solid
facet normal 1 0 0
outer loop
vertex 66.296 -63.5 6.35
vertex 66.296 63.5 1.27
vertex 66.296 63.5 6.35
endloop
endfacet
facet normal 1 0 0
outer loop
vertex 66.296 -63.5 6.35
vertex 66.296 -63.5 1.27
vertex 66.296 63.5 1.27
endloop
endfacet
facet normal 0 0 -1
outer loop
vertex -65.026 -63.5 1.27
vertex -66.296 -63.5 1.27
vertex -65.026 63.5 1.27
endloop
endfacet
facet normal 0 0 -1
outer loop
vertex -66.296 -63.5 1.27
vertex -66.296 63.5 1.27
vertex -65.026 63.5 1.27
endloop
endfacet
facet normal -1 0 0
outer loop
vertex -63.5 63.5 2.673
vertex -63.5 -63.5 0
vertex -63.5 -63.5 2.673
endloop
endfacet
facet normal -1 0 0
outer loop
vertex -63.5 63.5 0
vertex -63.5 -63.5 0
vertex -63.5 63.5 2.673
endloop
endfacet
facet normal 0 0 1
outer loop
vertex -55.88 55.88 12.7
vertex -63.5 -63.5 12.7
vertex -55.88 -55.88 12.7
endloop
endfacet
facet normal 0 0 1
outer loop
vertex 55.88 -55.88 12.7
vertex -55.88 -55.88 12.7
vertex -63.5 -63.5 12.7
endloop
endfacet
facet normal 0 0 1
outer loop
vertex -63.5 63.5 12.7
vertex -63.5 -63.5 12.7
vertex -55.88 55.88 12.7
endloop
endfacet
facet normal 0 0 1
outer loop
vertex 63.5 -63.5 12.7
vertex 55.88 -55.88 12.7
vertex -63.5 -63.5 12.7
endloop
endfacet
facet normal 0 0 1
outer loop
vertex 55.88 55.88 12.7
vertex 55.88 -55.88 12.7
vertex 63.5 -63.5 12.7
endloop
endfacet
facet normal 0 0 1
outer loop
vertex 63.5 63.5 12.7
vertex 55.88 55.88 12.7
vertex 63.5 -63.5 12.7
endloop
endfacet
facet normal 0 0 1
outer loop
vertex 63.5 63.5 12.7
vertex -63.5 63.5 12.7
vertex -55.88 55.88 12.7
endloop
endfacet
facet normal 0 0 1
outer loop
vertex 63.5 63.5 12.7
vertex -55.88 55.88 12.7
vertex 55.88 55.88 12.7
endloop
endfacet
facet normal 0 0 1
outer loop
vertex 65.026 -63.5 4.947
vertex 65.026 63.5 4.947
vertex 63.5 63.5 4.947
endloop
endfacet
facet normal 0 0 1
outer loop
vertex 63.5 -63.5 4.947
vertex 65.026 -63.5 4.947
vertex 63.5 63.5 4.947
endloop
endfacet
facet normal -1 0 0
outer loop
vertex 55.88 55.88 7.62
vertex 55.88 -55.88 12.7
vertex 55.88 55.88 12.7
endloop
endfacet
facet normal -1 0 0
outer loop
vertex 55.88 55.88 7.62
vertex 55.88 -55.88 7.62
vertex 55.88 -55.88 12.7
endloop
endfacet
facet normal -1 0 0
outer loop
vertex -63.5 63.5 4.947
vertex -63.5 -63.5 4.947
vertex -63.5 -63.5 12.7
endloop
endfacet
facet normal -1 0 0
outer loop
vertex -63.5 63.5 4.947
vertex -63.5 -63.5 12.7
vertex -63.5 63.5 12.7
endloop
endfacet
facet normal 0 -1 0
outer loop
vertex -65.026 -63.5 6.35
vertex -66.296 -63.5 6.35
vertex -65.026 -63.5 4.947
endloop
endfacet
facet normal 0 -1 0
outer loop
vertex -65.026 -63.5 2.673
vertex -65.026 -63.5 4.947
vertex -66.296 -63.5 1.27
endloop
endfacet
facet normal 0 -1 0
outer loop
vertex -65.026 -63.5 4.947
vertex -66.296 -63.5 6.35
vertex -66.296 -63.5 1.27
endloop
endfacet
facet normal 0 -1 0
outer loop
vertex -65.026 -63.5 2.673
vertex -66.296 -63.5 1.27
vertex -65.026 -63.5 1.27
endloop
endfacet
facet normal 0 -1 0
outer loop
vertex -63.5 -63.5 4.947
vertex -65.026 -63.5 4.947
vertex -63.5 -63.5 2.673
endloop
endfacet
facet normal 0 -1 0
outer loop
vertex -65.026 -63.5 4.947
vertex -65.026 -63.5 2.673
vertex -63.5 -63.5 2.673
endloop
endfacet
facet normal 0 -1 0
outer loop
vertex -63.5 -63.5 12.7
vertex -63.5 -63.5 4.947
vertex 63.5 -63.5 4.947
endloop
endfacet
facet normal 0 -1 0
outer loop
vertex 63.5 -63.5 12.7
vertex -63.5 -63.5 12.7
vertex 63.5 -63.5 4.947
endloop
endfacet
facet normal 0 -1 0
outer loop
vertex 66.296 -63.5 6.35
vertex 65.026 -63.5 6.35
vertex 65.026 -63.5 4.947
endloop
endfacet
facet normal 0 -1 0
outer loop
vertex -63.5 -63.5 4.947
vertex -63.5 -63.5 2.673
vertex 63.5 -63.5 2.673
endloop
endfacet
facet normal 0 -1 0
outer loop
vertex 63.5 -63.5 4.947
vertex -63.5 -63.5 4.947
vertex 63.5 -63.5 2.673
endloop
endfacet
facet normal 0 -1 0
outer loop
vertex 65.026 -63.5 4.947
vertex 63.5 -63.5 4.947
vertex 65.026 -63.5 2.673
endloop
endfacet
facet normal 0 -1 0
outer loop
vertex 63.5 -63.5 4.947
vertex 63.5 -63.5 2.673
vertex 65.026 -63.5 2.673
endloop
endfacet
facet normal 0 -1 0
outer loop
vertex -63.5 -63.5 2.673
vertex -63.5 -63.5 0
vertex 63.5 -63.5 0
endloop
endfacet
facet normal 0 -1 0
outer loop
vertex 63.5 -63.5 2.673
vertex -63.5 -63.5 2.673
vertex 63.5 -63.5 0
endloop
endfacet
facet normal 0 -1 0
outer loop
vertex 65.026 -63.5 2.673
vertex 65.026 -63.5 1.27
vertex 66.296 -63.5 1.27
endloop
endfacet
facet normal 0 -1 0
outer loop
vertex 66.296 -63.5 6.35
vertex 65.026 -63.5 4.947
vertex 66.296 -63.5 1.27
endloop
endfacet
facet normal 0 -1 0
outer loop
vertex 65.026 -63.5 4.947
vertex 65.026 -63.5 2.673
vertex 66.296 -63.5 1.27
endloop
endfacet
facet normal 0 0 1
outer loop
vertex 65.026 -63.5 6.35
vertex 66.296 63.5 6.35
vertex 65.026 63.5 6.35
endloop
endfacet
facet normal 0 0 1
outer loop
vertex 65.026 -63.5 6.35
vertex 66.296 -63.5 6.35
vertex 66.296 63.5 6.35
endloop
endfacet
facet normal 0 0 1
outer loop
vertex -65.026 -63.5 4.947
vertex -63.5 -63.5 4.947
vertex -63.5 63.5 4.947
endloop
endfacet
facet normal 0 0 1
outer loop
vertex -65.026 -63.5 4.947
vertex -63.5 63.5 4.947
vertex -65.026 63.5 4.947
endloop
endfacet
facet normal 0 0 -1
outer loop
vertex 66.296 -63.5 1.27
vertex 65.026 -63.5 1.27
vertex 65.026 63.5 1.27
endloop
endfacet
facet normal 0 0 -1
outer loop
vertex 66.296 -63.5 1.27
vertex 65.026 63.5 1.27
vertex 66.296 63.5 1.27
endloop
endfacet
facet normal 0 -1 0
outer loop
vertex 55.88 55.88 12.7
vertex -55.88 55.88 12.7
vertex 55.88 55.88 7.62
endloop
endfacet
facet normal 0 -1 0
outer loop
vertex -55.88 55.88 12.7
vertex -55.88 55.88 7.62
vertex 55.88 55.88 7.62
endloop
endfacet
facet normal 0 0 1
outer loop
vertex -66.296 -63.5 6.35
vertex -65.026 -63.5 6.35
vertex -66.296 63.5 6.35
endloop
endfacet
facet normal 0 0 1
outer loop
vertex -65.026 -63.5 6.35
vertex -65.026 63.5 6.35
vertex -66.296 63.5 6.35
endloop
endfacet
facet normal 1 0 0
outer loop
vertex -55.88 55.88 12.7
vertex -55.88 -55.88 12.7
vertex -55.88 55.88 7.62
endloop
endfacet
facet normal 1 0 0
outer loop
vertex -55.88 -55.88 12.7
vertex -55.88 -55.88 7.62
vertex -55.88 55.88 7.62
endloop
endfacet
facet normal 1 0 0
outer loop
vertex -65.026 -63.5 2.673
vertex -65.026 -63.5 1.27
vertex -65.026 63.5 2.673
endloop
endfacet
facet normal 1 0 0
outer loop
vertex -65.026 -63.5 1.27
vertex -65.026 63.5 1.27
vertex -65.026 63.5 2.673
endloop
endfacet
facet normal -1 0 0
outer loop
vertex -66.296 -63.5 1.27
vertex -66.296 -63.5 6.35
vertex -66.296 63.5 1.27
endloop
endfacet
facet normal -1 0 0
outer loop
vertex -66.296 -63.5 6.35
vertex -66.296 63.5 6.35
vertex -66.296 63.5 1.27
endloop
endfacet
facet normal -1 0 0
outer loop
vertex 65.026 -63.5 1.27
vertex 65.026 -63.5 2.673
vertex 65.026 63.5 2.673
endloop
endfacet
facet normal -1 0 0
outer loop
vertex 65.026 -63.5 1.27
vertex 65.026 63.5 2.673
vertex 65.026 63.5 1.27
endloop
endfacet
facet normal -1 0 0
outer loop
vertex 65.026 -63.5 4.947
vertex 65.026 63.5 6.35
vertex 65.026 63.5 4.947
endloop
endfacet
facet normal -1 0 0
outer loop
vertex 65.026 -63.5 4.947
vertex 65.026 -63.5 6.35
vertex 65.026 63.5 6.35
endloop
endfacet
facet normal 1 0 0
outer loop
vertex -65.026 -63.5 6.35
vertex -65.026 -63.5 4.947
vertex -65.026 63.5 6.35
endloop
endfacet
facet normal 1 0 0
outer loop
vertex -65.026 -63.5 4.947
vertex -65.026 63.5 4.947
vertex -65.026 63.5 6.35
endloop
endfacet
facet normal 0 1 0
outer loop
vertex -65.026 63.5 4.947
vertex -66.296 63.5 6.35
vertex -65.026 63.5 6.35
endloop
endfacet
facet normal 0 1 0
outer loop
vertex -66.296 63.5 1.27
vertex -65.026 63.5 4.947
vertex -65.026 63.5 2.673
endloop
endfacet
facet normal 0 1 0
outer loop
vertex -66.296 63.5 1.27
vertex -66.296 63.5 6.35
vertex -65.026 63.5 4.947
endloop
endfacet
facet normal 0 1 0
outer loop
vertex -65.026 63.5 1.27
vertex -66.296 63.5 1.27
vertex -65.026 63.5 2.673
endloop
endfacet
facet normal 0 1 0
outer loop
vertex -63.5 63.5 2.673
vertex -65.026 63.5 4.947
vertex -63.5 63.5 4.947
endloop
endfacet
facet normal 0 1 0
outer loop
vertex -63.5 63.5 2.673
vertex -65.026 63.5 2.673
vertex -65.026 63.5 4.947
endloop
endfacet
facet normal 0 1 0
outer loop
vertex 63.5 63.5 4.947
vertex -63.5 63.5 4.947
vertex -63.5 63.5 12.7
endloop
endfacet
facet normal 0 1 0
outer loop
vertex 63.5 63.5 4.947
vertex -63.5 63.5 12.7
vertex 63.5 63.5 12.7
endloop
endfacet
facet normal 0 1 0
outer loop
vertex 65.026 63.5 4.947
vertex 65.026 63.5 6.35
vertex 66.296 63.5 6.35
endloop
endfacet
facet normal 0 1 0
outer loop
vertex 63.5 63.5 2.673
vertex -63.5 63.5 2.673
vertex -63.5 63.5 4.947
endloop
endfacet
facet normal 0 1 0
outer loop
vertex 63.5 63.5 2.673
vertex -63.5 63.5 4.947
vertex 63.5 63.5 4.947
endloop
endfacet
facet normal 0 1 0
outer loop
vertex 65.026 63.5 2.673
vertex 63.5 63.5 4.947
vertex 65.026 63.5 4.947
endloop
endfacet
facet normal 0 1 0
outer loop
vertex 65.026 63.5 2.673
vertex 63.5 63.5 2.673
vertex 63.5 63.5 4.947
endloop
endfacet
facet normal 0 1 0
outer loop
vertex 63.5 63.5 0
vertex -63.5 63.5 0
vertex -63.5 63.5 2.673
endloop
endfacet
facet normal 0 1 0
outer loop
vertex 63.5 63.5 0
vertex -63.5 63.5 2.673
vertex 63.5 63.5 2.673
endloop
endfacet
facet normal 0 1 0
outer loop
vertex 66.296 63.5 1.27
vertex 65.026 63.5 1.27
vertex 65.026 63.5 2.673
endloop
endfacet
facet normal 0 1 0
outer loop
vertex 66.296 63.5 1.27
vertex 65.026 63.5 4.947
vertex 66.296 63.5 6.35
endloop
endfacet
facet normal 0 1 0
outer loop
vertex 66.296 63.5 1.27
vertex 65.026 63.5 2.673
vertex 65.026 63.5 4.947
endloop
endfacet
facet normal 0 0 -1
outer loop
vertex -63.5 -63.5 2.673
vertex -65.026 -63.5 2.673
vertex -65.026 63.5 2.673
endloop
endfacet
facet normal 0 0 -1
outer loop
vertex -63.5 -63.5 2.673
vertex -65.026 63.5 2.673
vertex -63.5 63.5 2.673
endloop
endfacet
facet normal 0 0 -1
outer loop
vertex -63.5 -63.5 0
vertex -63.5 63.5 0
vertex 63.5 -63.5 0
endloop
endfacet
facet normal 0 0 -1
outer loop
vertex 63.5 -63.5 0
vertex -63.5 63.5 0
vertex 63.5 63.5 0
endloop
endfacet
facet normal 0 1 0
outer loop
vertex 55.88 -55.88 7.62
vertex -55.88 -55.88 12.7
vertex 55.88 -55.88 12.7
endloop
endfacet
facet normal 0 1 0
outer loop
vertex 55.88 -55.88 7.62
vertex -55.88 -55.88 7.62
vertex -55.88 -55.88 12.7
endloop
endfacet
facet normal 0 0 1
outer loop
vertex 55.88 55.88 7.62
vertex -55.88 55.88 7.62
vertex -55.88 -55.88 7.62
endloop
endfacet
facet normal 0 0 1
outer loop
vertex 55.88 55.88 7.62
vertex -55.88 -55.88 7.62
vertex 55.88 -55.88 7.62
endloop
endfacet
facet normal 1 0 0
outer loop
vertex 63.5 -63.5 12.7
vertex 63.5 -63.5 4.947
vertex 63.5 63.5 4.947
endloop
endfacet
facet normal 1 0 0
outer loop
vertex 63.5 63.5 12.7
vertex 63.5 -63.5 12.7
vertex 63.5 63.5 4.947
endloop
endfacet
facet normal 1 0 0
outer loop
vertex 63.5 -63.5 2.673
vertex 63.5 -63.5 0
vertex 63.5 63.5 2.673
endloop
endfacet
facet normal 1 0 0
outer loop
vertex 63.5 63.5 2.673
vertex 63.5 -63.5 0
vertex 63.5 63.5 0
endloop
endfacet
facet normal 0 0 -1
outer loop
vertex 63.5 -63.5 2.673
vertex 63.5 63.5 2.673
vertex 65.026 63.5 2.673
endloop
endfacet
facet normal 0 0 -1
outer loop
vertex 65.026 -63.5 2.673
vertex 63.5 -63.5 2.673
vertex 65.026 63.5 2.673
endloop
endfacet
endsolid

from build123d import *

# Parameters (mm, degrees)
F0_W     = 127
F0_H     = 127
F1_DEPTH = 12.7
F2_T     = -7.62
F4_DEPTH = 63.5


with BuildPart() as f1:
    # F0 (on Top) → F1 (new body)
    with BuildSketch(Plane.XY):
        Rectangle(F0_W, F0_H)
    extrude(amount=F1_DEPTH)

    # F2
    f2_openings = [f1.faces().sort_by_distance(p)[0] for p in [
        (0, 0, 12.7),
    ]]
    offset(amount=F2_T, openings=f2_openings)

    # F3 (on Front) → F4 (join, symmetric)
    with BuildSketch(Plane.XZ):
        Polygon((-63.5, 4.947344), (-65.025825, 4.947344), (-65.025825, 2.672656), (-63.5, 2.672656), (-63.5, 3.81), align=None)
        Polygon((-65.025825, 2.672656), (-65.025825, 4.947344), (-65.025825, 6.35), (-66.295825, 6.35), (-66.295825, 1.27), (-65.025825, 1.27), align=None)
        Polygon((65.025825, 6.35), (65.025825, 4.947344), (65.025825, 2.672656), (65.025825, 1.27), (66.295825, 1.27), (66.295825, 6.35), align=None)
        Polygon((65.025825, 2.672656), (65.025825, 4.947344), (63.5, 4.947344), (63.5, 3.81), (63.5, 2.672656), align=None)
    extrude(amount=F4_DEPTH, both=True)


solid = f1.part
